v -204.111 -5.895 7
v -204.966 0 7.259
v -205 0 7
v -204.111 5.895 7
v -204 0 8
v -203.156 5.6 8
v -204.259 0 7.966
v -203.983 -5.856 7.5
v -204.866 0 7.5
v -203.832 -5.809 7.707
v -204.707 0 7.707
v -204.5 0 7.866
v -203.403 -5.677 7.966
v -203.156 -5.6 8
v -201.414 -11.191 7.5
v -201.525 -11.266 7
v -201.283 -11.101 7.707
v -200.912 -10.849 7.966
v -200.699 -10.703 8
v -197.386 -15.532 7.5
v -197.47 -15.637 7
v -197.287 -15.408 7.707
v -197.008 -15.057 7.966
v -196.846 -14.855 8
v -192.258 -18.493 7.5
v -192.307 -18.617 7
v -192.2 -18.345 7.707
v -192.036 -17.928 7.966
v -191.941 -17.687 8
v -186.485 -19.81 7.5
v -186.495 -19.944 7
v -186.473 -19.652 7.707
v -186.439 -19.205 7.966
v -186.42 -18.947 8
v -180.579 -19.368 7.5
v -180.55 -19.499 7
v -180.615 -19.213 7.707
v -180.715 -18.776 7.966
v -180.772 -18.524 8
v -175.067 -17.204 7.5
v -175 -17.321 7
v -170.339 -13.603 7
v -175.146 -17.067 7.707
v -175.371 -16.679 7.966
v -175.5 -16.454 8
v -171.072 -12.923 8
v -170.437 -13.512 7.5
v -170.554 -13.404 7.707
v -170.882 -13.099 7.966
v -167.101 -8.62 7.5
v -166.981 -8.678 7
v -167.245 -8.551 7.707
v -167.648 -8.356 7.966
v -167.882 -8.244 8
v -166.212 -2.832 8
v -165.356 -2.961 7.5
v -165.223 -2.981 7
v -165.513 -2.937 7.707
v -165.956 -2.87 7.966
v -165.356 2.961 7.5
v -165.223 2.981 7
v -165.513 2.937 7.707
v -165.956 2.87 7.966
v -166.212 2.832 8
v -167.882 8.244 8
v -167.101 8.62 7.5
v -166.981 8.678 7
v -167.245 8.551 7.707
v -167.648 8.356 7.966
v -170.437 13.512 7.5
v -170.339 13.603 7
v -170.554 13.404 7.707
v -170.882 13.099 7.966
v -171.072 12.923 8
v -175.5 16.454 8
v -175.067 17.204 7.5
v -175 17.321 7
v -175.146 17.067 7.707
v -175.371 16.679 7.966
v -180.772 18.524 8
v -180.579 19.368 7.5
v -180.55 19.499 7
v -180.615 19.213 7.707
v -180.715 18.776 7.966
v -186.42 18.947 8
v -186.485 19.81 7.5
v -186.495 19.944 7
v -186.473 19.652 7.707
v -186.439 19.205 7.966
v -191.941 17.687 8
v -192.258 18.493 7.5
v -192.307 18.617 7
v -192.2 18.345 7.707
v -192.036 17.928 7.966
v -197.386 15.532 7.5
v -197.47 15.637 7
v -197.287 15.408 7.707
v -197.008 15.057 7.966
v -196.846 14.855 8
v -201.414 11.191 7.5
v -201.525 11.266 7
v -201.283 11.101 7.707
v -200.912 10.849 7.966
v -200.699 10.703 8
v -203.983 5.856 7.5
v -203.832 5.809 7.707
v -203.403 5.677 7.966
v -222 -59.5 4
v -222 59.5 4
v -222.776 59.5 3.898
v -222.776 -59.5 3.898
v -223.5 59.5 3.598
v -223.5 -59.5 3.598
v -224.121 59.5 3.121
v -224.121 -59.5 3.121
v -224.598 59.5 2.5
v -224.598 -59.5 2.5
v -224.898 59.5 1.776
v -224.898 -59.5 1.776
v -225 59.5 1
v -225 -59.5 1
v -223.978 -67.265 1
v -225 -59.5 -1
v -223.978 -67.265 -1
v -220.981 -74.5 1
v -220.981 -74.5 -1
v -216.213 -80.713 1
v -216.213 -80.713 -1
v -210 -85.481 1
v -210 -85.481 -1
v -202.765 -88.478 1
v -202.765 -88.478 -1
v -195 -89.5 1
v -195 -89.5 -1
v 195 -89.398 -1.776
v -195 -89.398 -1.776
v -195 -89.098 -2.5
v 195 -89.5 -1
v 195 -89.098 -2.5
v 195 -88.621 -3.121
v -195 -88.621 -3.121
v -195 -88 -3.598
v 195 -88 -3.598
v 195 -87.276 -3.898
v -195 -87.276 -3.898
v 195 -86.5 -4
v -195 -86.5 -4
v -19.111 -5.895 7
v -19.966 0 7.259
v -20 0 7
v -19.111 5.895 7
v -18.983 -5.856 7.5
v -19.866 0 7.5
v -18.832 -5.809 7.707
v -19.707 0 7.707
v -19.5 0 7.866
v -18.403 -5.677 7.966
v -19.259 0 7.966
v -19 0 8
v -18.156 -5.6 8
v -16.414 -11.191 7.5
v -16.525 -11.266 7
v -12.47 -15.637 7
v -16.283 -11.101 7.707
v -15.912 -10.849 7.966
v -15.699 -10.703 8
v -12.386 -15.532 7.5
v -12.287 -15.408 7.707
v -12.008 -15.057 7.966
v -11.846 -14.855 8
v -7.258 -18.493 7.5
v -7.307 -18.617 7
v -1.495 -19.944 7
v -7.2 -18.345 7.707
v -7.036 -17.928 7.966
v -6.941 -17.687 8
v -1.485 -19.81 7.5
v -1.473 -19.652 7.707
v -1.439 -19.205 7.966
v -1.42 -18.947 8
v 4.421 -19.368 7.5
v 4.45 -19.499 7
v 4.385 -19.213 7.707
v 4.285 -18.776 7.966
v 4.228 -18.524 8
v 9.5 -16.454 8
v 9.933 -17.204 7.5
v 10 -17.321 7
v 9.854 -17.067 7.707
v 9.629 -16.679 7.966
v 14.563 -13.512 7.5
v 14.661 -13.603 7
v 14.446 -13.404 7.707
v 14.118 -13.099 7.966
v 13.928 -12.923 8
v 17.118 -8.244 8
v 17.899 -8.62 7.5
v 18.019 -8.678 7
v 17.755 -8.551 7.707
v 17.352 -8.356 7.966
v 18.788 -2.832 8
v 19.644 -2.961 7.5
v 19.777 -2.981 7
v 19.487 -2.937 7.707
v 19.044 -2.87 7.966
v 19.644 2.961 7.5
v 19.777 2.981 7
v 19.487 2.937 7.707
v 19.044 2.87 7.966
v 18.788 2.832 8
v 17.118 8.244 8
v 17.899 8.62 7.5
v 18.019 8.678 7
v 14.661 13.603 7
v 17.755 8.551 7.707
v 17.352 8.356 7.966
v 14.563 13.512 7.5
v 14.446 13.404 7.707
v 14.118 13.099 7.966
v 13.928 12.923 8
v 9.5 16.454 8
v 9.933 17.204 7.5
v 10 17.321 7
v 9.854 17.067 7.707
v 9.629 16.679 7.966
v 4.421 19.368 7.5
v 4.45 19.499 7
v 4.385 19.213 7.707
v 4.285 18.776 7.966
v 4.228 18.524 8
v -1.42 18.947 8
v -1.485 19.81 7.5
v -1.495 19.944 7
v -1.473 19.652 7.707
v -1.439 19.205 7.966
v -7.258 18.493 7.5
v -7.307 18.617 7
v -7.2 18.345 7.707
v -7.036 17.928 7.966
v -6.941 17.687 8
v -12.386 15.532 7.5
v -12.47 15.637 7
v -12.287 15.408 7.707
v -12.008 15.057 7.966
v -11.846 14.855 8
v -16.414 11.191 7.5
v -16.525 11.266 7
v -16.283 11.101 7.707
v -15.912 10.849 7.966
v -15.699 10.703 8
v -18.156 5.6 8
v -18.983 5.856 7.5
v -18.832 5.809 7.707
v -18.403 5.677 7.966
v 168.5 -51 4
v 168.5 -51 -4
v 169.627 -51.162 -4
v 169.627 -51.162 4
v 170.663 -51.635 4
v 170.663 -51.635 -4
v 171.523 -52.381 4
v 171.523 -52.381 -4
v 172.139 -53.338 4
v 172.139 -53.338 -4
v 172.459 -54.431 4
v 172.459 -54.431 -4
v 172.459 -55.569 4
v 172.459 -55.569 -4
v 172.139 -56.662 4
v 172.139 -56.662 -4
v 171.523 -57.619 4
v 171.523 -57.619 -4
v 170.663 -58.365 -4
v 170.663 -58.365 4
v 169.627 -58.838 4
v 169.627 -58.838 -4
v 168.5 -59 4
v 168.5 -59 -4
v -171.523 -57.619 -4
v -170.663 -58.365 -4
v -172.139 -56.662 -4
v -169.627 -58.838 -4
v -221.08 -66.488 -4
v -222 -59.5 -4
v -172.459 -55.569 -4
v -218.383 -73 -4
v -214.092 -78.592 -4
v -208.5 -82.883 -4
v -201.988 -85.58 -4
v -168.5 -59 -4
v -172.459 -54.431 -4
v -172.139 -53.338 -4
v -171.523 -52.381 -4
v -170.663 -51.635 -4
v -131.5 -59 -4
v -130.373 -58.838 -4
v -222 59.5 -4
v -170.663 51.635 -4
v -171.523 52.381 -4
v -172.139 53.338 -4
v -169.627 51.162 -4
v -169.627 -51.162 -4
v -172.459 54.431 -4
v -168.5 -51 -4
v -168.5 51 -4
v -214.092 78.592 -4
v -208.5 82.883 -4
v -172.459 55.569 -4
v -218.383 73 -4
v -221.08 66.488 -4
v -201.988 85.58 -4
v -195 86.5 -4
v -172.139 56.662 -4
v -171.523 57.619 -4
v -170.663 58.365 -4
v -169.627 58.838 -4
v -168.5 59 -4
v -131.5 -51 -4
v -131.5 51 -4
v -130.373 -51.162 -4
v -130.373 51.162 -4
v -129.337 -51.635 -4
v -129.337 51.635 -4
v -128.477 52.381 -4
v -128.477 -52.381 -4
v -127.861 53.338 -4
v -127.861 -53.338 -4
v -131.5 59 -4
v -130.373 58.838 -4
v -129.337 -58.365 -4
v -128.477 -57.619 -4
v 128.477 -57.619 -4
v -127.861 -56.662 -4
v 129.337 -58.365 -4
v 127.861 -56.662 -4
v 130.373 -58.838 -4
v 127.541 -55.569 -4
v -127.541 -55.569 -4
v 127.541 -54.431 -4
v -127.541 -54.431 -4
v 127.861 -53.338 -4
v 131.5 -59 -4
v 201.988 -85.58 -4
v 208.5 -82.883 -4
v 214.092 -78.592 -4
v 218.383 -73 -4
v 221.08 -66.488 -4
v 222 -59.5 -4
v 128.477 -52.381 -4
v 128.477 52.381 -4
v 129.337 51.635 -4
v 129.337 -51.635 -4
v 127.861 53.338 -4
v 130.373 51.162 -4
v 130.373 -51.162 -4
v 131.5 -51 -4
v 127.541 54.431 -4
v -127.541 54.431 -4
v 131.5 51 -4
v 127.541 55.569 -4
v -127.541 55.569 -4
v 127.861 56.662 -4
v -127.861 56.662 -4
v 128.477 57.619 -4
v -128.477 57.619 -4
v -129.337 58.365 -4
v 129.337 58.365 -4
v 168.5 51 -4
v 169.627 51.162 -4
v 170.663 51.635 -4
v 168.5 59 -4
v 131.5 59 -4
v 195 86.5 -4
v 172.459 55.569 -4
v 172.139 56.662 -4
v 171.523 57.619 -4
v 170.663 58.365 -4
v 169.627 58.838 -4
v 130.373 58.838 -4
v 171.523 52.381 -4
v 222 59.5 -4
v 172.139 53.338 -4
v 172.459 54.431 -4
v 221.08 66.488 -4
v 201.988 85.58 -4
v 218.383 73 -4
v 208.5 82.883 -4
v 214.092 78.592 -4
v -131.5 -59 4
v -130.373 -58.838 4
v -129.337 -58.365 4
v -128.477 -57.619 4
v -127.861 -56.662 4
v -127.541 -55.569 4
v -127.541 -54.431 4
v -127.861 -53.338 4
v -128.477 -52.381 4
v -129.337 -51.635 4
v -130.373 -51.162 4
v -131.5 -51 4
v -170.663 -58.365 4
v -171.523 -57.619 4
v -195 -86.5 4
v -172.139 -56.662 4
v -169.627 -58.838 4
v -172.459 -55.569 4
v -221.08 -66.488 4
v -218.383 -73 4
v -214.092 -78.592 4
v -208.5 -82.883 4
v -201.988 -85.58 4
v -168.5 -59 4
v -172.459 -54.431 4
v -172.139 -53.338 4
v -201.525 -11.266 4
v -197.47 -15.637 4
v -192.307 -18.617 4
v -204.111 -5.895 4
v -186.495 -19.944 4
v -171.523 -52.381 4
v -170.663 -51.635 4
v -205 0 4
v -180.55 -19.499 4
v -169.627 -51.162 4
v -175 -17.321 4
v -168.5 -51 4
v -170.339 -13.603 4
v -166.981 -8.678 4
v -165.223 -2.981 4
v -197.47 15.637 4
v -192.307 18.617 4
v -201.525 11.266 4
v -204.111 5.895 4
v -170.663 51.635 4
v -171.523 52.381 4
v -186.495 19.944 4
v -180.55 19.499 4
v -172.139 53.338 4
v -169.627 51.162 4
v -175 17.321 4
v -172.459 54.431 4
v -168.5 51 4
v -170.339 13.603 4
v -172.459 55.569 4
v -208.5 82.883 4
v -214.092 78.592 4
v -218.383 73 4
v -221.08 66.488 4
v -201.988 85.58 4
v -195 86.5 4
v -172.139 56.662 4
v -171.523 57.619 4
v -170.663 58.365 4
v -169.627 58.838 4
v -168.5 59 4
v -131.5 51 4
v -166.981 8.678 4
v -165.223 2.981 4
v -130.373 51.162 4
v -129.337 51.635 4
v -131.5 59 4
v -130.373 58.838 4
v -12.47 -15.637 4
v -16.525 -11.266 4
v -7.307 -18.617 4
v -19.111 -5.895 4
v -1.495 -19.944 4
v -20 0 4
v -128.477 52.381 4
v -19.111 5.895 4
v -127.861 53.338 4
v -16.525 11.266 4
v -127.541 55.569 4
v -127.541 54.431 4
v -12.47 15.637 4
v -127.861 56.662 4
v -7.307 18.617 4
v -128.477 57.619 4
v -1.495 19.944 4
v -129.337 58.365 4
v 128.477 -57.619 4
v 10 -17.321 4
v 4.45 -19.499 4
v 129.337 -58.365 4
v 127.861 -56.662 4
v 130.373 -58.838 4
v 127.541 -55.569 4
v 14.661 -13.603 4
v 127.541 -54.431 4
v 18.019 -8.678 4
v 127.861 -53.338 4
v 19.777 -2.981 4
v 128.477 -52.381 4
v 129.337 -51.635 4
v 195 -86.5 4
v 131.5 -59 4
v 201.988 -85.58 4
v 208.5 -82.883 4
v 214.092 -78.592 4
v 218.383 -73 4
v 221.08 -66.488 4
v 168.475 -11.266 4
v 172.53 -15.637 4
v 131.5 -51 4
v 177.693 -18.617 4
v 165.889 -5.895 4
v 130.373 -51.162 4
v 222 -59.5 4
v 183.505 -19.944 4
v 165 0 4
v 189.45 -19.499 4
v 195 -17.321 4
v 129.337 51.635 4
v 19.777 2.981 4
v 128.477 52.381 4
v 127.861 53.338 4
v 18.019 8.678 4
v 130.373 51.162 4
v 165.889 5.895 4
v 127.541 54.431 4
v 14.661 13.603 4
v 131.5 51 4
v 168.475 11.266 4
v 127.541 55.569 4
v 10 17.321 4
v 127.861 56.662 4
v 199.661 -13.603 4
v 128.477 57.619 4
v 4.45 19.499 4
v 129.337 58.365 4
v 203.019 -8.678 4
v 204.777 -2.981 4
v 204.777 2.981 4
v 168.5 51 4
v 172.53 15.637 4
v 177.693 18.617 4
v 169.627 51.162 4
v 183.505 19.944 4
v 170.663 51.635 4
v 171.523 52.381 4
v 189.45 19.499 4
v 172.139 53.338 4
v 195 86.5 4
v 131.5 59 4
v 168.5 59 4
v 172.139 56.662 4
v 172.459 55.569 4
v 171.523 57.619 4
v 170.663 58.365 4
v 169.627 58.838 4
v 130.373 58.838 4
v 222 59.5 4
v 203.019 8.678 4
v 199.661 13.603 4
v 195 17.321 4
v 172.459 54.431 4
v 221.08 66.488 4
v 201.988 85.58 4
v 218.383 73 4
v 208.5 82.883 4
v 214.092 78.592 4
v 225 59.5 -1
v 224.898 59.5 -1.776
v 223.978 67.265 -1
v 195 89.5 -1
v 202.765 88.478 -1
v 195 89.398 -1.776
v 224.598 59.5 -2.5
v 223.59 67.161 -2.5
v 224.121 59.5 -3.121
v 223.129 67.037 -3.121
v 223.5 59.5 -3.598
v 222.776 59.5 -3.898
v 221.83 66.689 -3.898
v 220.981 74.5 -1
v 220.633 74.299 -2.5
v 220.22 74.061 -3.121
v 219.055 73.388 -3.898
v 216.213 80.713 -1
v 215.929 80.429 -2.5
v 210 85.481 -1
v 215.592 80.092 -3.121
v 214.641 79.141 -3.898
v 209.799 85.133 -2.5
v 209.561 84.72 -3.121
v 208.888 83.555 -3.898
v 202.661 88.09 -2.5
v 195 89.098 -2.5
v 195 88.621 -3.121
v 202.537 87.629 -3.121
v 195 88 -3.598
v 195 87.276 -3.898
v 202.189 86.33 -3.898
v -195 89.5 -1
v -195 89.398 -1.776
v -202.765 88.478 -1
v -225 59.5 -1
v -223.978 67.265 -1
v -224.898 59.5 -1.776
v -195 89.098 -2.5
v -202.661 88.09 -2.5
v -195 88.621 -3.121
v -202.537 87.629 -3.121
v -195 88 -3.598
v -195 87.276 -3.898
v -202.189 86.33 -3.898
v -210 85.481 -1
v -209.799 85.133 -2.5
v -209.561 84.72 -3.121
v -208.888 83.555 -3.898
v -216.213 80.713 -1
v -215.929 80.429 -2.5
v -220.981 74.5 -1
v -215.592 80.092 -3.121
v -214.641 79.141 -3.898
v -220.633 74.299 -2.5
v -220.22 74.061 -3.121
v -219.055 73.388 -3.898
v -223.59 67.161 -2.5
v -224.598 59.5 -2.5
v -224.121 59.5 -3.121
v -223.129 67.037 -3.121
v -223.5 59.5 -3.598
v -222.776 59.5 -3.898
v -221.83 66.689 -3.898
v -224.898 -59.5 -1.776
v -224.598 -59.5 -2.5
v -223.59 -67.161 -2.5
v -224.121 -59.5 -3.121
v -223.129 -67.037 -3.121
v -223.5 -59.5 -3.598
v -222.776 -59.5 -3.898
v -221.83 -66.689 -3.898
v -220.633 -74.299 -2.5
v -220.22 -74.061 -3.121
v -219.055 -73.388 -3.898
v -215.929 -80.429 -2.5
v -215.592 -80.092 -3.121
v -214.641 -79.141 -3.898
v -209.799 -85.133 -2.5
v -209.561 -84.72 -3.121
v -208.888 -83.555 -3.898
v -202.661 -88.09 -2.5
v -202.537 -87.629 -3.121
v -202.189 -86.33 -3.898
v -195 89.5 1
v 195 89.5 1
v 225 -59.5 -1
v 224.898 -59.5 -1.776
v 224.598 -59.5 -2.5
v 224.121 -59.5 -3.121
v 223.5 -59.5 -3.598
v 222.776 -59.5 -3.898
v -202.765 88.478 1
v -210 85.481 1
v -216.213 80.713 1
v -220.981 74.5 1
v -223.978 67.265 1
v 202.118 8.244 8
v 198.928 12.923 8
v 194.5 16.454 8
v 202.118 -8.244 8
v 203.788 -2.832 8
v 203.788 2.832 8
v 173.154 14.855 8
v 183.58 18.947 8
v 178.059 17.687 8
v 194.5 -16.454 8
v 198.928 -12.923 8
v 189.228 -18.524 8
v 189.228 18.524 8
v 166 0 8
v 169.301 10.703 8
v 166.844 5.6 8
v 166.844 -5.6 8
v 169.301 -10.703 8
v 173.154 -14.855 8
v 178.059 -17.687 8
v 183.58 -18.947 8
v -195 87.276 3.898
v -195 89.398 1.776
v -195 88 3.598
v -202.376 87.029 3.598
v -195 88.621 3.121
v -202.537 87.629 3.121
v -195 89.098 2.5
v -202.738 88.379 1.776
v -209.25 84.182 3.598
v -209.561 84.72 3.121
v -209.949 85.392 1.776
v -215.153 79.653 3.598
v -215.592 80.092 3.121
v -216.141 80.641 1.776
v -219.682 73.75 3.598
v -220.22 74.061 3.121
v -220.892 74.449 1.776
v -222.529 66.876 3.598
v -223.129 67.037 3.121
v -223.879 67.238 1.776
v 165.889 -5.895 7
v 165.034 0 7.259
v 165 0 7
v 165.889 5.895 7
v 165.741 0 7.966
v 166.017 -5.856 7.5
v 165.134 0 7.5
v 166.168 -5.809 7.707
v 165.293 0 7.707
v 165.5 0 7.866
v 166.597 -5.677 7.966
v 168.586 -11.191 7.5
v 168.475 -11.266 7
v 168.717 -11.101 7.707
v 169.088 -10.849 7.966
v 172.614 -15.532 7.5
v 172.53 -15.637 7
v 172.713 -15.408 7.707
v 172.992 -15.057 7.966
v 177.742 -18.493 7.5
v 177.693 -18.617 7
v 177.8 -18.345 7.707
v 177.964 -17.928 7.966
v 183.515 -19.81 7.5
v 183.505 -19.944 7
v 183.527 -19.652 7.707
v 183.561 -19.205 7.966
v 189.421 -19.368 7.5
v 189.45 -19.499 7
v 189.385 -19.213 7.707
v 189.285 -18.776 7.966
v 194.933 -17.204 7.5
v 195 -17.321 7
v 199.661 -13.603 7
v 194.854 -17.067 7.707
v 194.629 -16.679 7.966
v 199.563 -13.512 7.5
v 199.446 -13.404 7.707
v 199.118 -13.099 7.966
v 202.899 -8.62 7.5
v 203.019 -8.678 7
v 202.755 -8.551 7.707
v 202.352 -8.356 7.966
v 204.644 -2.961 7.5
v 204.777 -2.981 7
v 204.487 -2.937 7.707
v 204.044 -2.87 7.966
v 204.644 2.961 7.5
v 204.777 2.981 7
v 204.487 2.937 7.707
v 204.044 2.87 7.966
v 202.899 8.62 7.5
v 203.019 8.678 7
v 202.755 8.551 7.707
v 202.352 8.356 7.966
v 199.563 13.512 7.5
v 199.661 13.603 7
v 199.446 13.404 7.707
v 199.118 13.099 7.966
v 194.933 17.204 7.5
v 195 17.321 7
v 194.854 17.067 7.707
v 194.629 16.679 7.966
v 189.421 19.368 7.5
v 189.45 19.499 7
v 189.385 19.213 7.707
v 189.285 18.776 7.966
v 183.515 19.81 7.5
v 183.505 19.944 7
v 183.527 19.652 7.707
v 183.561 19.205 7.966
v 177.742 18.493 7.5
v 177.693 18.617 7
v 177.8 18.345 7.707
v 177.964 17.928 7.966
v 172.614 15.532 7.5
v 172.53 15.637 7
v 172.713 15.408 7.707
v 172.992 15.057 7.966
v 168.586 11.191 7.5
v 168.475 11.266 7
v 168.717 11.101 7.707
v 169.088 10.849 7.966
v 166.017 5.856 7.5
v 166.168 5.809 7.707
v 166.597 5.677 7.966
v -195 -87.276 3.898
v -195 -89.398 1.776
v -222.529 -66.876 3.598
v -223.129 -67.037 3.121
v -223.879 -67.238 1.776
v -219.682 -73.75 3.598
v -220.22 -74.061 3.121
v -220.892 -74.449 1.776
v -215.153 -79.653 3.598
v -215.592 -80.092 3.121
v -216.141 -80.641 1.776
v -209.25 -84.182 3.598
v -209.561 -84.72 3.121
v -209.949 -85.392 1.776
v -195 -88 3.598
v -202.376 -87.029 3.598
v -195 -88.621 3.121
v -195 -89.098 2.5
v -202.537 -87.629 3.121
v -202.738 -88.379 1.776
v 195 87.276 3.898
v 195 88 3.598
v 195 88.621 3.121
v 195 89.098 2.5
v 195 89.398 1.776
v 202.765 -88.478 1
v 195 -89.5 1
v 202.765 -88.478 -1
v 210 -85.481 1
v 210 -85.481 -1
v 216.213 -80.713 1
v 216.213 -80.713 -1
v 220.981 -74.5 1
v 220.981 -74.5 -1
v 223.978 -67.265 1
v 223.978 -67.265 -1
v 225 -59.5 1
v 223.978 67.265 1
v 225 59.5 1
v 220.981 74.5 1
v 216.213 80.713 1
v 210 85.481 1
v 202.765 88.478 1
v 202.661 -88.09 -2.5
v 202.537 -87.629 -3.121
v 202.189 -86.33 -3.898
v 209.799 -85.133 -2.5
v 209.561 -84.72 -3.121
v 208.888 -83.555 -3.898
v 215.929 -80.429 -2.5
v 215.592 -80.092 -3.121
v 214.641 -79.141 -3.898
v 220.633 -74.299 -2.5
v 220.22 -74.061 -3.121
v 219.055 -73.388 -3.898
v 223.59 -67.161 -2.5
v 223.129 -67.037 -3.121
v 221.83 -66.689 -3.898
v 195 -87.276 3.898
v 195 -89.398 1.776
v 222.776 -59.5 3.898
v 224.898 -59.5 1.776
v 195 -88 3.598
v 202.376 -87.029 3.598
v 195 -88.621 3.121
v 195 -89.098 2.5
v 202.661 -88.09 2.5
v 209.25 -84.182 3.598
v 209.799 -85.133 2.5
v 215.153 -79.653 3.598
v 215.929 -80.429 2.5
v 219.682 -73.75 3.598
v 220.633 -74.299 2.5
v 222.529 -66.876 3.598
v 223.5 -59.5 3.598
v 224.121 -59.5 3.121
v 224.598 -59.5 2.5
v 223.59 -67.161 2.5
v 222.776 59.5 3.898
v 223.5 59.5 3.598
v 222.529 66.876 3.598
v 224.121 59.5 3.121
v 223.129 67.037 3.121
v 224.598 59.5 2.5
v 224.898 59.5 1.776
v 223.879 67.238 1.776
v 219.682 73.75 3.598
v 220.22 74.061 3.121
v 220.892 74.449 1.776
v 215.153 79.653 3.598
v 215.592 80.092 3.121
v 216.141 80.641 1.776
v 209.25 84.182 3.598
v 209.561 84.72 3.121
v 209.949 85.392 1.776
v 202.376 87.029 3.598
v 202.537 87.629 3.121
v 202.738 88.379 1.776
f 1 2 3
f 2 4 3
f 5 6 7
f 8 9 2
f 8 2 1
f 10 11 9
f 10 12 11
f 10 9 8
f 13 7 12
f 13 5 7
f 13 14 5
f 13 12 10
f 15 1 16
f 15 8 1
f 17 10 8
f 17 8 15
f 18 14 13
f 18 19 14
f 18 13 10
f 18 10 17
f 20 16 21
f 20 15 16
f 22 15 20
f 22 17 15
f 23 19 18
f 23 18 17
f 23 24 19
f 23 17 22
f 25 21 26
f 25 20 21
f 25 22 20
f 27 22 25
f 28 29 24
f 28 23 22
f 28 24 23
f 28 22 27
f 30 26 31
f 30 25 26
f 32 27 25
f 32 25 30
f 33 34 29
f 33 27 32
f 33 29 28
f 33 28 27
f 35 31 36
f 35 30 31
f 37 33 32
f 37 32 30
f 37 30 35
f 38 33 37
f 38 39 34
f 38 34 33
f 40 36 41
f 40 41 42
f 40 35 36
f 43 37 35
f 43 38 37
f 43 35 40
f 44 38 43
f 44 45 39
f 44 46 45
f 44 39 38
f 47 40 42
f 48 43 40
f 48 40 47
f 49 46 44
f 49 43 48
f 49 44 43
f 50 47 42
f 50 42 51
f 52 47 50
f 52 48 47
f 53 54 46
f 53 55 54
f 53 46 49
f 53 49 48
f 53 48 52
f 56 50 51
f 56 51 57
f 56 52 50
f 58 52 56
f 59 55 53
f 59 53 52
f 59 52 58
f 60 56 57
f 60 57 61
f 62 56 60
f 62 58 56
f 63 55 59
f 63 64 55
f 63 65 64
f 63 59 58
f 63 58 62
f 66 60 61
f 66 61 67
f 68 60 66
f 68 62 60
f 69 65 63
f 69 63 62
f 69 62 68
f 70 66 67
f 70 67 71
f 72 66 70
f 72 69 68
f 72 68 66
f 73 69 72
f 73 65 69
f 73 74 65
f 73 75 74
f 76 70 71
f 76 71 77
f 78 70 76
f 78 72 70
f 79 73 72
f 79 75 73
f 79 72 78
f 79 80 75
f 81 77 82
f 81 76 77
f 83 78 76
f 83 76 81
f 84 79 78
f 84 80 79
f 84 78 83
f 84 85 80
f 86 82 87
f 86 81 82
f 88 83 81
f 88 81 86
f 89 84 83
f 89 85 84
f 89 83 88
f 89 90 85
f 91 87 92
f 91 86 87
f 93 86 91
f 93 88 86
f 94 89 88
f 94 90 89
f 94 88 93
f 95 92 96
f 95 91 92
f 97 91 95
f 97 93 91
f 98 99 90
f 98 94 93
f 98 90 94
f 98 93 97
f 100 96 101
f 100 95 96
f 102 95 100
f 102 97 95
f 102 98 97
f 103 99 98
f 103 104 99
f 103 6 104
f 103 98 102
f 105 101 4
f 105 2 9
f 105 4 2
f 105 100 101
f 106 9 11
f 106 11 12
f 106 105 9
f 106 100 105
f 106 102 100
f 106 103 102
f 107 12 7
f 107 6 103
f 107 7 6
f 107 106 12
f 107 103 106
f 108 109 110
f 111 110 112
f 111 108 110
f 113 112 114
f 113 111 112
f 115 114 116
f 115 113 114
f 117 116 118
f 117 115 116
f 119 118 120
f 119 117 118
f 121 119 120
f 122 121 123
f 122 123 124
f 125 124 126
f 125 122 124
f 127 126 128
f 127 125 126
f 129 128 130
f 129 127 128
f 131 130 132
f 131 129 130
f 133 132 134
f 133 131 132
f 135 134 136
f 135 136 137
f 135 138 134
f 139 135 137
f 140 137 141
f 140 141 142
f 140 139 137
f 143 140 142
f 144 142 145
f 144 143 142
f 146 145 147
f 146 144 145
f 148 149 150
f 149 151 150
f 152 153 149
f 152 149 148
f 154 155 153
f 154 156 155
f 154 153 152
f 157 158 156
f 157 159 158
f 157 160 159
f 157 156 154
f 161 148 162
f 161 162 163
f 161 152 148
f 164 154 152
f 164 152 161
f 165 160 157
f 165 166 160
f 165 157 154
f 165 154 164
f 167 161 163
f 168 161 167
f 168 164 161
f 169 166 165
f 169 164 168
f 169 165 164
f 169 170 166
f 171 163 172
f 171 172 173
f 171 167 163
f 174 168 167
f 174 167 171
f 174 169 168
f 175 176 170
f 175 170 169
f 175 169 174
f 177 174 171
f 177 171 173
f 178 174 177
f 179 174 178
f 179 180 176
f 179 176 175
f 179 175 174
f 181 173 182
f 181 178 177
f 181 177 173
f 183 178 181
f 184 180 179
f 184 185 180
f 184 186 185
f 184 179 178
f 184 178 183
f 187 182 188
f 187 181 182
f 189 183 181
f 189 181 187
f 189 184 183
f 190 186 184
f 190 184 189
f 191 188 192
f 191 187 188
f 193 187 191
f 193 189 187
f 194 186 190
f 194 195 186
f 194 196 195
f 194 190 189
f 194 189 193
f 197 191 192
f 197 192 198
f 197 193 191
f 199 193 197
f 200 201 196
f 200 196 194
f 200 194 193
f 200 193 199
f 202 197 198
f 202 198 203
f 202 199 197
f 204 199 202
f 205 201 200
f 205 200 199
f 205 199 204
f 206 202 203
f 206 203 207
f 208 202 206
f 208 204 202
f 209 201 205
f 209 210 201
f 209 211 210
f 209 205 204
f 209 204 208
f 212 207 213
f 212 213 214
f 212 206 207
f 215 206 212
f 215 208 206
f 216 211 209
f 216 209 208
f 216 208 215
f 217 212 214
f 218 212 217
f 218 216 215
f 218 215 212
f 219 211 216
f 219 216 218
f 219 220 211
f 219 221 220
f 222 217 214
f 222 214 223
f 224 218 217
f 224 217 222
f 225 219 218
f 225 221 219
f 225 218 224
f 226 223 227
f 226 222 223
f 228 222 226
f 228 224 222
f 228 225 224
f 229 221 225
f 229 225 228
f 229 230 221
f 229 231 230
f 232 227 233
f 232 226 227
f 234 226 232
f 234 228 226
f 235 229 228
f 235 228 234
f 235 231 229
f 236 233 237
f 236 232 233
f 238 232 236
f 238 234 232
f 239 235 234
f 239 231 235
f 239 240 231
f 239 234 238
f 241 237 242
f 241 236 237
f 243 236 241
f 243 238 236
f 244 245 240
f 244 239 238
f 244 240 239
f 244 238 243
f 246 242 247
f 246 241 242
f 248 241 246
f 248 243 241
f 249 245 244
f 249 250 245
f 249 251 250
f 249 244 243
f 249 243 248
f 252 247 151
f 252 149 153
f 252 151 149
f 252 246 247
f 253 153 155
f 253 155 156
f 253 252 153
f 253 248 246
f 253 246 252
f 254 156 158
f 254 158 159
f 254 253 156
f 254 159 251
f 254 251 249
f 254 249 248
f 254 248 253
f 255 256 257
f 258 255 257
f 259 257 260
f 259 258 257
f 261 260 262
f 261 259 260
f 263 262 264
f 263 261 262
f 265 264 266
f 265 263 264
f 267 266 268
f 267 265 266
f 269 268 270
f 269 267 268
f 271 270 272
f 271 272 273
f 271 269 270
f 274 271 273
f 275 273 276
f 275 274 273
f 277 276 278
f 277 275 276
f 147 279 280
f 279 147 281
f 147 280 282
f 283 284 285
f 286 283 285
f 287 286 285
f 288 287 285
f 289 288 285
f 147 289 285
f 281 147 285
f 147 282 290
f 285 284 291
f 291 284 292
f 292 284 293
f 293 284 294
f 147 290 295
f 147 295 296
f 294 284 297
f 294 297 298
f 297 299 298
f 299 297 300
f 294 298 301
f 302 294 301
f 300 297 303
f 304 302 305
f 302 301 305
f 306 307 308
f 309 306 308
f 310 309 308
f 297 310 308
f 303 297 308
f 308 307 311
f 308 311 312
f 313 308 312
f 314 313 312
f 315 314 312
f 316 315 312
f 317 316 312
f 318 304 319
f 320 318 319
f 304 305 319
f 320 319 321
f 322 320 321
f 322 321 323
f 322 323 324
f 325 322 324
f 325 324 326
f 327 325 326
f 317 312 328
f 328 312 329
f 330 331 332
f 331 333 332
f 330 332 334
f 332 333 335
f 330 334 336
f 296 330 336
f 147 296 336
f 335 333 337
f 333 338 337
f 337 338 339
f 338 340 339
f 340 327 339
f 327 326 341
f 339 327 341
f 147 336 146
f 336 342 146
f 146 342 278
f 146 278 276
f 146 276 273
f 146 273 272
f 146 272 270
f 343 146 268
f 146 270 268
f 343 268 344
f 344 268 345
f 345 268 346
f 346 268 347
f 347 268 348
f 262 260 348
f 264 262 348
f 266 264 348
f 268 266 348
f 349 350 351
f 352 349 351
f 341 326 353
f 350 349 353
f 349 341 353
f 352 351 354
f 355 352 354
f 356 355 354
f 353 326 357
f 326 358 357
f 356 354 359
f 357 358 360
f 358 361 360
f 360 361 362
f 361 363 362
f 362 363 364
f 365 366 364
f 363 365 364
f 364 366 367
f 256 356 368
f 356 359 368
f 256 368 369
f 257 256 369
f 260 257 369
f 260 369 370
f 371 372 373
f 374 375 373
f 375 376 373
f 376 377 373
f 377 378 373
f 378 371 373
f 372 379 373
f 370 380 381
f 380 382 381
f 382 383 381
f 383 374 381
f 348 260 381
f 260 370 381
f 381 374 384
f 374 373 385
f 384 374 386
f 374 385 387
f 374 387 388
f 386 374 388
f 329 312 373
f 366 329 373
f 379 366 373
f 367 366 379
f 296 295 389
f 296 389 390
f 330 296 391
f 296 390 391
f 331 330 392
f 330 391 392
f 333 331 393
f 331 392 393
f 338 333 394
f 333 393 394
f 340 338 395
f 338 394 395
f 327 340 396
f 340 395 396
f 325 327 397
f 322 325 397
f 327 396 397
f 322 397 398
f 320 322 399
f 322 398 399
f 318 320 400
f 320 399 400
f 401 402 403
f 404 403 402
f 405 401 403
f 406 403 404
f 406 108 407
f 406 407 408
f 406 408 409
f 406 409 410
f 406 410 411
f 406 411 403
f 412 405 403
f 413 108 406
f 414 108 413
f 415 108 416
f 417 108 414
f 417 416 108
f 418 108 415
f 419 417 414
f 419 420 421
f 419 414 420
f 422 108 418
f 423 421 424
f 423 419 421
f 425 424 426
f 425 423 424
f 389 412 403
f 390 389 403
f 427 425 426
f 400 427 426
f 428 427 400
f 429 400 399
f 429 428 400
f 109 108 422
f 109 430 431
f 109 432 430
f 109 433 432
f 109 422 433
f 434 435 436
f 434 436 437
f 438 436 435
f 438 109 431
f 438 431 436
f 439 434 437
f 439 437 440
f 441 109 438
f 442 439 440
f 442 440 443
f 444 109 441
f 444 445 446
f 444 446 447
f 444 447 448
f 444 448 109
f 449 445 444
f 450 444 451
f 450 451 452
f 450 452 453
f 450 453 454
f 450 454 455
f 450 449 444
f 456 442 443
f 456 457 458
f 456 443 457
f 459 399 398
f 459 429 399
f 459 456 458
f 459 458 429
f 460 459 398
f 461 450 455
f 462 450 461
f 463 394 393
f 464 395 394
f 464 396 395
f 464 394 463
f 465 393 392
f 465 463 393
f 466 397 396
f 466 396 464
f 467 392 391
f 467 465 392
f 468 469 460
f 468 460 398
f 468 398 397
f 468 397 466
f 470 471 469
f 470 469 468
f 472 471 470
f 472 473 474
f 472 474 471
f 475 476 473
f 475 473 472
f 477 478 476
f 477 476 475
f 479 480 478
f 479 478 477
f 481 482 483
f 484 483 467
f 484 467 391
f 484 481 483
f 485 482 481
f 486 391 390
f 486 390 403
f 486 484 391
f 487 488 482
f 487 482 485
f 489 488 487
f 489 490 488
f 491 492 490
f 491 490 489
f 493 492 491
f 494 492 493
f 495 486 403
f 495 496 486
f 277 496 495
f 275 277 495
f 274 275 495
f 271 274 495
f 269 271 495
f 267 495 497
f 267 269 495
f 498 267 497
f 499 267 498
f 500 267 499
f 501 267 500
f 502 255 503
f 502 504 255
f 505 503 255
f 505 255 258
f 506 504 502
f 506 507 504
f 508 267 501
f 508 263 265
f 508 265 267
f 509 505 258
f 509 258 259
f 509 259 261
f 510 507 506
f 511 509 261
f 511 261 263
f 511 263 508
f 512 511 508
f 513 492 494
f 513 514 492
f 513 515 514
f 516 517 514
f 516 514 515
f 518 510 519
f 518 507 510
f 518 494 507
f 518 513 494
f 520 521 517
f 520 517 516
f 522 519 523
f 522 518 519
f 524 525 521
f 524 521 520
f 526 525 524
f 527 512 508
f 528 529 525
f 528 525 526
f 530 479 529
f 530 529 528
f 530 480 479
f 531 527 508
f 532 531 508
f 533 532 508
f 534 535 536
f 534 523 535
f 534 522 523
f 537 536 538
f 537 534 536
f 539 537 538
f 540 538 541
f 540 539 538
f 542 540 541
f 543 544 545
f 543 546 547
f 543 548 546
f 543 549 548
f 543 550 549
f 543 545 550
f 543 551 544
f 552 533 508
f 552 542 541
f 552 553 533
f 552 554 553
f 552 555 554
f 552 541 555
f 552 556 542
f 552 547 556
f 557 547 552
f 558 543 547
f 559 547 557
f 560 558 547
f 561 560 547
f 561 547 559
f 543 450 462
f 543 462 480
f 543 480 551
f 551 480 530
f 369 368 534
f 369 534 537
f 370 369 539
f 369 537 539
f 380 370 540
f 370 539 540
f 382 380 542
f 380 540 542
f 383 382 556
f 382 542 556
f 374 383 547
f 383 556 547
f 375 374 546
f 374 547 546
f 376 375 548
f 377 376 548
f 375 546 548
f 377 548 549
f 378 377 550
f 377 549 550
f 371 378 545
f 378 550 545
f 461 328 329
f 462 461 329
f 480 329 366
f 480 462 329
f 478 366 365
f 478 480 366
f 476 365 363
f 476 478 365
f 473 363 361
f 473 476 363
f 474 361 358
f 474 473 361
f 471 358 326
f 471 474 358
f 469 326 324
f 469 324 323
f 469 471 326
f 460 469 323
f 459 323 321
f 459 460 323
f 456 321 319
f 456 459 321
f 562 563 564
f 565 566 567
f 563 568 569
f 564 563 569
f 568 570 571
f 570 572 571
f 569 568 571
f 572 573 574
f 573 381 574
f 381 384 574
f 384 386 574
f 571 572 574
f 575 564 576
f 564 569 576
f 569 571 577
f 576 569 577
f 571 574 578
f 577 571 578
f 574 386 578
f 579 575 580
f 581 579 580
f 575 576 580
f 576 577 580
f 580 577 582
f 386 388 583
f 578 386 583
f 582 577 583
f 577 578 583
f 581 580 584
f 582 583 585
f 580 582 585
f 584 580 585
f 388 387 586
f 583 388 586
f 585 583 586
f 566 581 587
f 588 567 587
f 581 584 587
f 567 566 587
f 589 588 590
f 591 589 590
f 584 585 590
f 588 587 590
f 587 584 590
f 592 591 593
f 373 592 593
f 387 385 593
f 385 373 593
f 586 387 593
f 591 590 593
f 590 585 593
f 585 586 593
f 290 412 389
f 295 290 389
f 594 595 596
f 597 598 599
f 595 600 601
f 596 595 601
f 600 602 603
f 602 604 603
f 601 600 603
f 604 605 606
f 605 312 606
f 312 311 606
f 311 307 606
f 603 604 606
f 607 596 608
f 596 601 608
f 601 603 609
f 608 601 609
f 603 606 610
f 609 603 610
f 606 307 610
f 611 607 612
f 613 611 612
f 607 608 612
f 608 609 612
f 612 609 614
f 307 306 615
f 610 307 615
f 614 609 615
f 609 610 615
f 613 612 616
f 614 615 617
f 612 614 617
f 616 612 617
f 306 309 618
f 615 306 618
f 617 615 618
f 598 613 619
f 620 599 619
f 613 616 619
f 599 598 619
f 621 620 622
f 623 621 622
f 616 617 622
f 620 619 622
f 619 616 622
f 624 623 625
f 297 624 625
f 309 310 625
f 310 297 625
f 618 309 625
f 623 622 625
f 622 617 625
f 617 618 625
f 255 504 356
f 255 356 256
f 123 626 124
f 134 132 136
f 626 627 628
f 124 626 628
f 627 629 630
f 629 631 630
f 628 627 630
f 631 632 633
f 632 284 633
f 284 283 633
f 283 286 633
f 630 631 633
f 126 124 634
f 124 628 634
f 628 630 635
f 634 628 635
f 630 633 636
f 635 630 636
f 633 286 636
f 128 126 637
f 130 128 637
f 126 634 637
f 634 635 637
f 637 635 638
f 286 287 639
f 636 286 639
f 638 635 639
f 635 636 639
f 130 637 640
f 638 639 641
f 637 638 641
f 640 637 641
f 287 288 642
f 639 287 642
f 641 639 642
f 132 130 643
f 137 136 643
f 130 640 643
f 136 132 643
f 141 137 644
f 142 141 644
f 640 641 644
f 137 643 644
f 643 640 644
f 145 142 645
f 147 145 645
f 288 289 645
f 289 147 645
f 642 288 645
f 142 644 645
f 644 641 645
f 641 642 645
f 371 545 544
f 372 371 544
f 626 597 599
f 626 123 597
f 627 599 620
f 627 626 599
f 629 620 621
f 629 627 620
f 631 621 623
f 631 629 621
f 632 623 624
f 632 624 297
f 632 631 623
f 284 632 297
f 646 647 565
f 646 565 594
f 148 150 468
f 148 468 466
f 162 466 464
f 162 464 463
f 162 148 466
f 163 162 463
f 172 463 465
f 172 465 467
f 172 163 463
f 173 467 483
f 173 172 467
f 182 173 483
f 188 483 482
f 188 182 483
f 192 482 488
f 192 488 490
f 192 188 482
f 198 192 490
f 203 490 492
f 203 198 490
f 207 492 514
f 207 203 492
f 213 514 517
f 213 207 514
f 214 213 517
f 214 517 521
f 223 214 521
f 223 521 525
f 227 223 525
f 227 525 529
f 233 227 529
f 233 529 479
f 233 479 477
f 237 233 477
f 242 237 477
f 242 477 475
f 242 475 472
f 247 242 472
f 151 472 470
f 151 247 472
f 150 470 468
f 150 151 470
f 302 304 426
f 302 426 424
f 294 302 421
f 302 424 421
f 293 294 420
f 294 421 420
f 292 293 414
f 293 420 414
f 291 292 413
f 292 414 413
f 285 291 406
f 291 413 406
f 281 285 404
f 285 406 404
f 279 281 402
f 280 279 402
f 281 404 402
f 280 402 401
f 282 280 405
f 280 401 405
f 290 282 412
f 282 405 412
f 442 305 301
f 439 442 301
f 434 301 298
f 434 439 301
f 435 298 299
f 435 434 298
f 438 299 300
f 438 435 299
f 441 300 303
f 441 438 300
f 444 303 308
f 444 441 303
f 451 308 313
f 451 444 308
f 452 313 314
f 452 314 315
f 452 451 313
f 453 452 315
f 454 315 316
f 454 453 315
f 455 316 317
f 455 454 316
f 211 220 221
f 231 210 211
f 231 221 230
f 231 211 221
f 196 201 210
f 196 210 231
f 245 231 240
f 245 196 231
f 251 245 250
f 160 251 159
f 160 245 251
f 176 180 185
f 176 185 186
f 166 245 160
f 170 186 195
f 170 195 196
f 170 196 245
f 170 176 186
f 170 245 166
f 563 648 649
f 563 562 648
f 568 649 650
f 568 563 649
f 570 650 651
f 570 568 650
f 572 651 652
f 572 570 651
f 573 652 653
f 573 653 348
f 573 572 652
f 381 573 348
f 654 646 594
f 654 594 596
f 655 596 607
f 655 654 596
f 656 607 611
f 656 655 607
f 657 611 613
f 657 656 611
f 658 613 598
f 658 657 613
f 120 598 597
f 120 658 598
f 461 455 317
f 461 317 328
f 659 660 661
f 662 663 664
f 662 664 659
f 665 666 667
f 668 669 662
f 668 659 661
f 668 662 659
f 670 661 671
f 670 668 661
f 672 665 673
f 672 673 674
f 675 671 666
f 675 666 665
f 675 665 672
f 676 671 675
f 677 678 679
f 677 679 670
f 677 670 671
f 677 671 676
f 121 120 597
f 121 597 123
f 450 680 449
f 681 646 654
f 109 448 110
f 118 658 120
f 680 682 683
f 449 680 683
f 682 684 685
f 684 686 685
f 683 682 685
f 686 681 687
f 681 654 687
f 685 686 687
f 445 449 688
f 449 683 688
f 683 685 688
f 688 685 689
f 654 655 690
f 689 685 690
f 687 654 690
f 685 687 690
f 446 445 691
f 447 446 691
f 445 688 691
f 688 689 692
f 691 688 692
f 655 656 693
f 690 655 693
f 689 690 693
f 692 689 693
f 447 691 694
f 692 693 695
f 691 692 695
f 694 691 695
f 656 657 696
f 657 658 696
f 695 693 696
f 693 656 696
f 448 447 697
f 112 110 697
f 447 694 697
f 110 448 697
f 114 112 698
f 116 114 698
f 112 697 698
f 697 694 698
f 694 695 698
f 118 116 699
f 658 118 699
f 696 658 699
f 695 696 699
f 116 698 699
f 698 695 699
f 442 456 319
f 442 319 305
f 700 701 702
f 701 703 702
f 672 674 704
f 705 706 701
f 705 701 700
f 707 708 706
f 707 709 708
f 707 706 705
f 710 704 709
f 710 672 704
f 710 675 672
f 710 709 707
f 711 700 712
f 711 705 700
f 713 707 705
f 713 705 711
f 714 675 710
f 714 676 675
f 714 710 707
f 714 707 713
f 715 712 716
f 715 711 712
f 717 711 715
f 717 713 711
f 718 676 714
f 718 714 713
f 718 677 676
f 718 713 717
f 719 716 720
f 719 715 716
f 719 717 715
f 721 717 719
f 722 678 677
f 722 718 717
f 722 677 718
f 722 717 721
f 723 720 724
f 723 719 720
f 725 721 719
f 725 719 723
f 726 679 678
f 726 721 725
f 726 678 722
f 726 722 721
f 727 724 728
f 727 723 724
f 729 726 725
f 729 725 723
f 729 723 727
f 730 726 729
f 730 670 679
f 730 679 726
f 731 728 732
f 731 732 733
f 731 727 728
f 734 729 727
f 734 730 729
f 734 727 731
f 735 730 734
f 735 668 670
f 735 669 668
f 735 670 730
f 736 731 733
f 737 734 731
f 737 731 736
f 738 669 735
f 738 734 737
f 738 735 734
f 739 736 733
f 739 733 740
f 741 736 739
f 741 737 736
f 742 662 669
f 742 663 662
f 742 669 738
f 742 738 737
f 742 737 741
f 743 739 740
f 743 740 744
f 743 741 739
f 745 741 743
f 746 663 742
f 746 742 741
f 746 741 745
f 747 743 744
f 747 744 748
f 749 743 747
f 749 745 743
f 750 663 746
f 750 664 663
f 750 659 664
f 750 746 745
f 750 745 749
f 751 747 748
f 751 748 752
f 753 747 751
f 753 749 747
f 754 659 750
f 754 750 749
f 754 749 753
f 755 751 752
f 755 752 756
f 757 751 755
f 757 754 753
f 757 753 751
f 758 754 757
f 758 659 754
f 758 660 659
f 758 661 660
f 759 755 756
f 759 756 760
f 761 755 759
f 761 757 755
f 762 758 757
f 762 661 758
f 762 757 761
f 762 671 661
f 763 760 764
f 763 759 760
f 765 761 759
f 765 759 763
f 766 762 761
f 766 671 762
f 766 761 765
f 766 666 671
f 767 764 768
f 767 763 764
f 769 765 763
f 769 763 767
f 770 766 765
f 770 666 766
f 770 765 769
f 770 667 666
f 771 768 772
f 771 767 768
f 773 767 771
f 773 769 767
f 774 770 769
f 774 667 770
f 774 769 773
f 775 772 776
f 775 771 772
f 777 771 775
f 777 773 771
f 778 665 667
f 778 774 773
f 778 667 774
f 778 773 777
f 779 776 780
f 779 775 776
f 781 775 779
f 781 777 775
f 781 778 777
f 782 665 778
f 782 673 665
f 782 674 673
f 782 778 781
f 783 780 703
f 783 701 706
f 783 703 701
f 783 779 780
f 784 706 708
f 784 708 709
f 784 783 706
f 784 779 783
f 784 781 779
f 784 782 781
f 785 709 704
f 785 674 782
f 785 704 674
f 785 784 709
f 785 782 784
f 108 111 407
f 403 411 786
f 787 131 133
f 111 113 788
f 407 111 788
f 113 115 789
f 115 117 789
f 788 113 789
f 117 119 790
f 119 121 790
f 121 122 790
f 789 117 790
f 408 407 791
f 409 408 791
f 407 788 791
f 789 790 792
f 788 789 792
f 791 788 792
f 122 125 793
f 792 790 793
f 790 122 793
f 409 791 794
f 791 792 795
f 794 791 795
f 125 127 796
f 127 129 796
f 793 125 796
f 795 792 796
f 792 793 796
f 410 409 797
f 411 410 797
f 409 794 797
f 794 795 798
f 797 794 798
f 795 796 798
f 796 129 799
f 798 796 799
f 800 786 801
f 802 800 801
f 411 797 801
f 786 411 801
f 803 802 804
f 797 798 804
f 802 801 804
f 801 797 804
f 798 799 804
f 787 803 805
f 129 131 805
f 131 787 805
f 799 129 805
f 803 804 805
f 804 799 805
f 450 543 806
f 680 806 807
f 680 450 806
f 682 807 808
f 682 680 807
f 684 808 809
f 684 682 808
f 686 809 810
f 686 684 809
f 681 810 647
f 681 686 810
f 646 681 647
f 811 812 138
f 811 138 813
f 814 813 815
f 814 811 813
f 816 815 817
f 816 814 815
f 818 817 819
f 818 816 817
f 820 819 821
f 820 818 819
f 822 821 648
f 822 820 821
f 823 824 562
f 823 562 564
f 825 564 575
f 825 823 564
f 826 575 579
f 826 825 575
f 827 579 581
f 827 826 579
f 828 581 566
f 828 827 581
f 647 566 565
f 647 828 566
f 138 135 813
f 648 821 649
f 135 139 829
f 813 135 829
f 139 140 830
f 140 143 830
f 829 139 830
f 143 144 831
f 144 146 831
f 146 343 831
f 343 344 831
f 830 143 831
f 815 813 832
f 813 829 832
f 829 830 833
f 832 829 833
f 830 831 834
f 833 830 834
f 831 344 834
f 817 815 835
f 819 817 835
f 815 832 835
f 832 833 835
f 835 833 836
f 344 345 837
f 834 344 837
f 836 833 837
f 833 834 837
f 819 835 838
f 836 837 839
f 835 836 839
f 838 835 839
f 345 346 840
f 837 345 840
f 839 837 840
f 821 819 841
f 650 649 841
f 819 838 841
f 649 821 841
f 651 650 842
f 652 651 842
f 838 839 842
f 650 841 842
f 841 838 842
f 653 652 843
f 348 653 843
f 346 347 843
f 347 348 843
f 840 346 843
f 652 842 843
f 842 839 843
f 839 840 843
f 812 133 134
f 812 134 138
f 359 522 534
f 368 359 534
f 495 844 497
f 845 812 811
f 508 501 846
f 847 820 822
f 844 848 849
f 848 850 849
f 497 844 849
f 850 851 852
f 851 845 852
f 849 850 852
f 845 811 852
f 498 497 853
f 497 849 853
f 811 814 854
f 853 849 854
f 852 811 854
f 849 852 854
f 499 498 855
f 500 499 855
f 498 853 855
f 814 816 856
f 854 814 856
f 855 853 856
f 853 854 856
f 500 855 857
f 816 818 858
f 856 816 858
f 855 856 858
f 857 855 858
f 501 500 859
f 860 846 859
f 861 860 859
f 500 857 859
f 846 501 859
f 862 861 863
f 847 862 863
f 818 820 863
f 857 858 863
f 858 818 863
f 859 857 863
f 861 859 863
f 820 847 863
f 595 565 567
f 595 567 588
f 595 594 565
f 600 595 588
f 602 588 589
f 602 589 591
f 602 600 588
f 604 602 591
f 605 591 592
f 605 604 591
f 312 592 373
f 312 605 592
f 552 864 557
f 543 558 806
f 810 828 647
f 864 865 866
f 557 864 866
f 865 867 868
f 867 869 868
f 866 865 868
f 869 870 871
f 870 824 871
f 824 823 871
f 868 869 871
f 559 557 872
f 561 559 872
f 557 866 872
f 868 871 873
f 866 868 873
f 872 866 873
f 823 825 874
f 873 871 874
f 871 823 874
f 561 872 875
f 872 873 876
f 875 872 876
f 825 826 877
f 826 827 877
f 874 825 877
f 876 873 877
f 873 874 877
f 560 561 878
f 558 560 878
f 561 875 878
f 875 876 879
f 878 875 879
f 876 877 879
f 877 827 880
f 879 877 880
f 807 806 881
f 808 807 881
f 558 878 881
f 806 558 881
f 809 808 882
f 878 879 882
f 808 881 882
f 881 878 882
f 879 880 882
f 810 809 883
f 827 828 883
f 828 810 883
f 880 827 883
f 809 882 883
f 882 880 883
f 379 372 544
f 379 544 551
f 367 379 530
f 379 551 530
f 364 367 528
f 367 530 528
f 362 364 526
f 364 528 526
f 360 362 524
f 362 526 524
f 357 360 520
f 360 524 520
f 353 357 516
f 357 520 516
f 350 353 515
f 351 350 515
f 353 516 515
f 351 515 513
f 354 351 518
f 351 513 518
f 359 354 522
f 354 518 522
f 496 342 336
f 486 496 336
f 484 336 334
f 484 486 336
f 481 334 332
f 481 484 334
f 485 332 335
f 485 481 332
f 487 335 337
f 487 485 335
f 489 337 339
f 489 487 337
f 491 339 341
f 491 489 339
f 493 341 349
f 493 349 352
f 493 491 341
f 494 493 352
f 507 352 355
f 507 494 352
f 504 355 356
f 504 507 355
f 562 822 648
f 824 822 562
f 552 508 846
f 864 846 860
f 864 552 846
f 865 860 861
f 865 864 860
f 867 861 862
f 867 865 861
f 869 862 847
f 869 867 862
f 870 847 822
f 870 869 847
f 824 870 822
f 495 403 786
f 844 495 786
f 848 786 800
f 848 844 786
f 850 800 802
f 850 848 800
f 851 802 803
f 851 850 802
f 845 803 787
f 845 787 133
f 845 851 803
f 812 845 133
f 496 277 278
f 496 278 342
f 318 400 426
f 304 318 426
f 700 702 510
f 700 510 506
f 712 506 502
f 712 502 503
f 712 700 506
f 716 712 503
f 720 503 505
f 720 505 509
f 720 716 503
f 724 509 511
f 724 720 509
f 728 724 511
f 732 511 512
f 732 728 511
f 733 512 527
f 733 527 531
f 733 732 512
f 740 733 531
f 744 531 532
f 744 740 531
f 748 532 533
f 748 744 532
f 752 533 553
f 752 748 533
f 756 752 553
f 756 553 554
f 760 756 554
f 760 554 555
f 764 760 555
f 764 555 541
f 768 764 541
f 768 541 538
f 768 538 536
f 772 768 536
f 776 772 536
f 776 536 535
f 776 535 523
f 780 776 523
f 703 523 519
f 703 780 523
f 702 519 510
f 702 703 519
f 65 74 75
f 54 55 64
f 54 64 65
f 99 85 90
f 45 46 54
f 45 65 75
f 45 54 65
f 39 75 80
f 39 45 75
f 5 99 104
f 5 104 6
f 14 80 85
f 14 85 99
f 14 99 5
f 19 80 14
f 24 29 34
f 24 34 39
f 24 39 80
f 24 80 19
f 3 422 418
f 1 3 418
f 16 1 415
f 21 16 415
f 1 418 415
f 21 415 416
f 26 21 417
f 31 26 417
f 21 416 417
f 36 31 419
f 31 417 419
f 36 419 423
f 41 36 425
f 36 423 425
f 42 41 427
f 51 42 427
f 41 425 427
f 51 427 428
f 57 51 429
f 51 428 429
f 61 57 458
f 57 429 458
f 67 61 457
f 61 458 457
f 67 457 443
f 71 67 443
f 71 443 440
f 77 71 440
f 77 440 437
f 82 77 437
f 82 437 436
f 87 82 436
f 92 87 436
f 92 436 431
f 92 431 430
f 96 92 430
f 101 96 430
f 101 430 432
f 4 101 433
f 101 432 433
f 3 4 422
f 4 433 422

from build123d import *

# Parameters (mm, degrees)
BOSS_EXTRUDE1_DEPTH = 4
SKETCH2_R           = 20
BOSS_EXTRUDE2_DEPTH = 4
SKETCH3_R           = 20
BOSS_EXTRUDE3_DEPTH = 4
CUT_EXTRUDE2_DEPTH  = 8
FILLET1_R           = 3
FILLET2_R           = 1


with BuildPart() as part:
    # Sketch1 → Boss-Extrude1 (new, symmetric)
    with BuildSketch(Plane.XY):
        with BuildLine():
            Line((195, 89.5), (-195, 89.5))
            ThreePointArc((-195, 89.5), (-216.213203436, 80.713203436), (-225, 59.5))
            Line((-225, 59.5), (-225, -59.5))
            ThreePointArc((-225, -59.5), (-216.213203436, -80.713203436), (-195, -89.5))
            Line((-195, -89.5), (195, -89.5))
            ThreePointArc((195, -89.5), (216.213203436, -80.713203436), (225, -59.5))
            Line((225, -59.5), (225, 59.5))
            ThreePointArc((225, 59.5), (216.213203436, 80.713203436), (195, 89.5))
        make_face()
    extrude(amount=BOSS_EXTRUDE1_DEPTH, both=True)

    # Sketch2 → Boss-Extrude2 (add, symmetric)
    with BuildSketch(Plane.XY.offset(4)):
        with Locations(Location((-185, 0, 0), (0, 0, 180))):
            Circle(SKETCH2_R)
        with Locations(Location((185, 0, 0), (0, 0, 180))):
            Circle(SKETCH2_R)
    extrude(amount=BOSS_EXTRUDE2_DEPTH, both=True)

    # Sketch3 → Boss-Extrude3 (add, symmetric)
    with BuildSketch(Plane.XY.offset(4)):
        with Locations(Location((0, 0, 0), (0, 0, 180))):
            Circle(SKETCH3_R)
    extrude(amount=BOSS_EXTRUDE3_DEPTH, both=True)

    # Sketch4 → Cut-Extrude2 (cut)
    with BuildSketch(Plane.XY.offset(4)):
        with BuildLine():
            Line((-168.5, 59), (-131.5, 59))
            ThreePointArc((-131.5, 59), (-127.5, 55), (-131.5, 51))
            Line((-131.5, 51), (-168.5, 51))
            ThreePointArc((-168.5, 51), (-172.5, 55), (-168.5, 59))
        make_face()
        with BuildLine():
            Line((168.5, 59), (131.5, 59))
            ThreePointArc((131.5, 59), (127.5, 55), (131.5, 51))
            Line((131.5, 51), (168.5, 51))
            ThreePointArc((168.5, 51), (172.5, 55), (168.5, 59))
        make_face()
        with BuildLine():
            Line((-168.5, -59), (-131.5, -59))
            ThreePointArc((-131.5, -59), (-127.5, -55), (-131.5, -51))
            Line((-131.5, -51), (-168.5, -51))
            ThreePointArc((-168.5, -51), (-172.5, -55), (-168.5, -59))
        make_face()
        with BuildLine():
            Line((168.5, -59), (131.5, -59))
            ThreePointArc((131.5, -59), (127.5, -55), (131.5, -51))
            Line((131.5, -51), (168.5, -51))
            ThreePointArc((168.5, -51), (172.5, -55), (168.5, -59))
        make_face()
    extrude(amount=-CUT_EXTRUDE2_DEPTH, mode=Mode.SUBTRACT)

    # Fillet1
    fillet1_edges = [part.edges().sort_by_distance(p)[0] for p in [
        (225, 0, -4),
        (216.213203436, -80.713203436, -4),
        (0, -89.5, -4),
        (-216.213203436, -80.713203436, -4),
        (216.213203436, -80.713203436, 4),
        (225, 0, 4),
        (216.213203436, 80.713203436, 4),
        (0, 89.5, 4),
        (-216.213203436, 80.713203436, 4),
        (-225, 0, 4),
        (-216.213203436, -80.713203436, 4),
        (-225, 0, -4),
        (0, -89.5, 4),
        (-216.213203436, 80.713203436, -4),
        (0, 89.5, -4),
        (216.213203436, 80.713203436, -4),
    ]]
    fillet(fillet1_edges, radius=FILLET1_R)

    # Fillet2
    fillet2_edges = [part.edges().sort_by_distance(p)[0] for p in [
        (205, 0, 8),
        (-165, 0, 8),
        (20, 0, 8),
    ]]
    fillet(fillet2_edges, radius=FILLET2_R)


solid = part.part
